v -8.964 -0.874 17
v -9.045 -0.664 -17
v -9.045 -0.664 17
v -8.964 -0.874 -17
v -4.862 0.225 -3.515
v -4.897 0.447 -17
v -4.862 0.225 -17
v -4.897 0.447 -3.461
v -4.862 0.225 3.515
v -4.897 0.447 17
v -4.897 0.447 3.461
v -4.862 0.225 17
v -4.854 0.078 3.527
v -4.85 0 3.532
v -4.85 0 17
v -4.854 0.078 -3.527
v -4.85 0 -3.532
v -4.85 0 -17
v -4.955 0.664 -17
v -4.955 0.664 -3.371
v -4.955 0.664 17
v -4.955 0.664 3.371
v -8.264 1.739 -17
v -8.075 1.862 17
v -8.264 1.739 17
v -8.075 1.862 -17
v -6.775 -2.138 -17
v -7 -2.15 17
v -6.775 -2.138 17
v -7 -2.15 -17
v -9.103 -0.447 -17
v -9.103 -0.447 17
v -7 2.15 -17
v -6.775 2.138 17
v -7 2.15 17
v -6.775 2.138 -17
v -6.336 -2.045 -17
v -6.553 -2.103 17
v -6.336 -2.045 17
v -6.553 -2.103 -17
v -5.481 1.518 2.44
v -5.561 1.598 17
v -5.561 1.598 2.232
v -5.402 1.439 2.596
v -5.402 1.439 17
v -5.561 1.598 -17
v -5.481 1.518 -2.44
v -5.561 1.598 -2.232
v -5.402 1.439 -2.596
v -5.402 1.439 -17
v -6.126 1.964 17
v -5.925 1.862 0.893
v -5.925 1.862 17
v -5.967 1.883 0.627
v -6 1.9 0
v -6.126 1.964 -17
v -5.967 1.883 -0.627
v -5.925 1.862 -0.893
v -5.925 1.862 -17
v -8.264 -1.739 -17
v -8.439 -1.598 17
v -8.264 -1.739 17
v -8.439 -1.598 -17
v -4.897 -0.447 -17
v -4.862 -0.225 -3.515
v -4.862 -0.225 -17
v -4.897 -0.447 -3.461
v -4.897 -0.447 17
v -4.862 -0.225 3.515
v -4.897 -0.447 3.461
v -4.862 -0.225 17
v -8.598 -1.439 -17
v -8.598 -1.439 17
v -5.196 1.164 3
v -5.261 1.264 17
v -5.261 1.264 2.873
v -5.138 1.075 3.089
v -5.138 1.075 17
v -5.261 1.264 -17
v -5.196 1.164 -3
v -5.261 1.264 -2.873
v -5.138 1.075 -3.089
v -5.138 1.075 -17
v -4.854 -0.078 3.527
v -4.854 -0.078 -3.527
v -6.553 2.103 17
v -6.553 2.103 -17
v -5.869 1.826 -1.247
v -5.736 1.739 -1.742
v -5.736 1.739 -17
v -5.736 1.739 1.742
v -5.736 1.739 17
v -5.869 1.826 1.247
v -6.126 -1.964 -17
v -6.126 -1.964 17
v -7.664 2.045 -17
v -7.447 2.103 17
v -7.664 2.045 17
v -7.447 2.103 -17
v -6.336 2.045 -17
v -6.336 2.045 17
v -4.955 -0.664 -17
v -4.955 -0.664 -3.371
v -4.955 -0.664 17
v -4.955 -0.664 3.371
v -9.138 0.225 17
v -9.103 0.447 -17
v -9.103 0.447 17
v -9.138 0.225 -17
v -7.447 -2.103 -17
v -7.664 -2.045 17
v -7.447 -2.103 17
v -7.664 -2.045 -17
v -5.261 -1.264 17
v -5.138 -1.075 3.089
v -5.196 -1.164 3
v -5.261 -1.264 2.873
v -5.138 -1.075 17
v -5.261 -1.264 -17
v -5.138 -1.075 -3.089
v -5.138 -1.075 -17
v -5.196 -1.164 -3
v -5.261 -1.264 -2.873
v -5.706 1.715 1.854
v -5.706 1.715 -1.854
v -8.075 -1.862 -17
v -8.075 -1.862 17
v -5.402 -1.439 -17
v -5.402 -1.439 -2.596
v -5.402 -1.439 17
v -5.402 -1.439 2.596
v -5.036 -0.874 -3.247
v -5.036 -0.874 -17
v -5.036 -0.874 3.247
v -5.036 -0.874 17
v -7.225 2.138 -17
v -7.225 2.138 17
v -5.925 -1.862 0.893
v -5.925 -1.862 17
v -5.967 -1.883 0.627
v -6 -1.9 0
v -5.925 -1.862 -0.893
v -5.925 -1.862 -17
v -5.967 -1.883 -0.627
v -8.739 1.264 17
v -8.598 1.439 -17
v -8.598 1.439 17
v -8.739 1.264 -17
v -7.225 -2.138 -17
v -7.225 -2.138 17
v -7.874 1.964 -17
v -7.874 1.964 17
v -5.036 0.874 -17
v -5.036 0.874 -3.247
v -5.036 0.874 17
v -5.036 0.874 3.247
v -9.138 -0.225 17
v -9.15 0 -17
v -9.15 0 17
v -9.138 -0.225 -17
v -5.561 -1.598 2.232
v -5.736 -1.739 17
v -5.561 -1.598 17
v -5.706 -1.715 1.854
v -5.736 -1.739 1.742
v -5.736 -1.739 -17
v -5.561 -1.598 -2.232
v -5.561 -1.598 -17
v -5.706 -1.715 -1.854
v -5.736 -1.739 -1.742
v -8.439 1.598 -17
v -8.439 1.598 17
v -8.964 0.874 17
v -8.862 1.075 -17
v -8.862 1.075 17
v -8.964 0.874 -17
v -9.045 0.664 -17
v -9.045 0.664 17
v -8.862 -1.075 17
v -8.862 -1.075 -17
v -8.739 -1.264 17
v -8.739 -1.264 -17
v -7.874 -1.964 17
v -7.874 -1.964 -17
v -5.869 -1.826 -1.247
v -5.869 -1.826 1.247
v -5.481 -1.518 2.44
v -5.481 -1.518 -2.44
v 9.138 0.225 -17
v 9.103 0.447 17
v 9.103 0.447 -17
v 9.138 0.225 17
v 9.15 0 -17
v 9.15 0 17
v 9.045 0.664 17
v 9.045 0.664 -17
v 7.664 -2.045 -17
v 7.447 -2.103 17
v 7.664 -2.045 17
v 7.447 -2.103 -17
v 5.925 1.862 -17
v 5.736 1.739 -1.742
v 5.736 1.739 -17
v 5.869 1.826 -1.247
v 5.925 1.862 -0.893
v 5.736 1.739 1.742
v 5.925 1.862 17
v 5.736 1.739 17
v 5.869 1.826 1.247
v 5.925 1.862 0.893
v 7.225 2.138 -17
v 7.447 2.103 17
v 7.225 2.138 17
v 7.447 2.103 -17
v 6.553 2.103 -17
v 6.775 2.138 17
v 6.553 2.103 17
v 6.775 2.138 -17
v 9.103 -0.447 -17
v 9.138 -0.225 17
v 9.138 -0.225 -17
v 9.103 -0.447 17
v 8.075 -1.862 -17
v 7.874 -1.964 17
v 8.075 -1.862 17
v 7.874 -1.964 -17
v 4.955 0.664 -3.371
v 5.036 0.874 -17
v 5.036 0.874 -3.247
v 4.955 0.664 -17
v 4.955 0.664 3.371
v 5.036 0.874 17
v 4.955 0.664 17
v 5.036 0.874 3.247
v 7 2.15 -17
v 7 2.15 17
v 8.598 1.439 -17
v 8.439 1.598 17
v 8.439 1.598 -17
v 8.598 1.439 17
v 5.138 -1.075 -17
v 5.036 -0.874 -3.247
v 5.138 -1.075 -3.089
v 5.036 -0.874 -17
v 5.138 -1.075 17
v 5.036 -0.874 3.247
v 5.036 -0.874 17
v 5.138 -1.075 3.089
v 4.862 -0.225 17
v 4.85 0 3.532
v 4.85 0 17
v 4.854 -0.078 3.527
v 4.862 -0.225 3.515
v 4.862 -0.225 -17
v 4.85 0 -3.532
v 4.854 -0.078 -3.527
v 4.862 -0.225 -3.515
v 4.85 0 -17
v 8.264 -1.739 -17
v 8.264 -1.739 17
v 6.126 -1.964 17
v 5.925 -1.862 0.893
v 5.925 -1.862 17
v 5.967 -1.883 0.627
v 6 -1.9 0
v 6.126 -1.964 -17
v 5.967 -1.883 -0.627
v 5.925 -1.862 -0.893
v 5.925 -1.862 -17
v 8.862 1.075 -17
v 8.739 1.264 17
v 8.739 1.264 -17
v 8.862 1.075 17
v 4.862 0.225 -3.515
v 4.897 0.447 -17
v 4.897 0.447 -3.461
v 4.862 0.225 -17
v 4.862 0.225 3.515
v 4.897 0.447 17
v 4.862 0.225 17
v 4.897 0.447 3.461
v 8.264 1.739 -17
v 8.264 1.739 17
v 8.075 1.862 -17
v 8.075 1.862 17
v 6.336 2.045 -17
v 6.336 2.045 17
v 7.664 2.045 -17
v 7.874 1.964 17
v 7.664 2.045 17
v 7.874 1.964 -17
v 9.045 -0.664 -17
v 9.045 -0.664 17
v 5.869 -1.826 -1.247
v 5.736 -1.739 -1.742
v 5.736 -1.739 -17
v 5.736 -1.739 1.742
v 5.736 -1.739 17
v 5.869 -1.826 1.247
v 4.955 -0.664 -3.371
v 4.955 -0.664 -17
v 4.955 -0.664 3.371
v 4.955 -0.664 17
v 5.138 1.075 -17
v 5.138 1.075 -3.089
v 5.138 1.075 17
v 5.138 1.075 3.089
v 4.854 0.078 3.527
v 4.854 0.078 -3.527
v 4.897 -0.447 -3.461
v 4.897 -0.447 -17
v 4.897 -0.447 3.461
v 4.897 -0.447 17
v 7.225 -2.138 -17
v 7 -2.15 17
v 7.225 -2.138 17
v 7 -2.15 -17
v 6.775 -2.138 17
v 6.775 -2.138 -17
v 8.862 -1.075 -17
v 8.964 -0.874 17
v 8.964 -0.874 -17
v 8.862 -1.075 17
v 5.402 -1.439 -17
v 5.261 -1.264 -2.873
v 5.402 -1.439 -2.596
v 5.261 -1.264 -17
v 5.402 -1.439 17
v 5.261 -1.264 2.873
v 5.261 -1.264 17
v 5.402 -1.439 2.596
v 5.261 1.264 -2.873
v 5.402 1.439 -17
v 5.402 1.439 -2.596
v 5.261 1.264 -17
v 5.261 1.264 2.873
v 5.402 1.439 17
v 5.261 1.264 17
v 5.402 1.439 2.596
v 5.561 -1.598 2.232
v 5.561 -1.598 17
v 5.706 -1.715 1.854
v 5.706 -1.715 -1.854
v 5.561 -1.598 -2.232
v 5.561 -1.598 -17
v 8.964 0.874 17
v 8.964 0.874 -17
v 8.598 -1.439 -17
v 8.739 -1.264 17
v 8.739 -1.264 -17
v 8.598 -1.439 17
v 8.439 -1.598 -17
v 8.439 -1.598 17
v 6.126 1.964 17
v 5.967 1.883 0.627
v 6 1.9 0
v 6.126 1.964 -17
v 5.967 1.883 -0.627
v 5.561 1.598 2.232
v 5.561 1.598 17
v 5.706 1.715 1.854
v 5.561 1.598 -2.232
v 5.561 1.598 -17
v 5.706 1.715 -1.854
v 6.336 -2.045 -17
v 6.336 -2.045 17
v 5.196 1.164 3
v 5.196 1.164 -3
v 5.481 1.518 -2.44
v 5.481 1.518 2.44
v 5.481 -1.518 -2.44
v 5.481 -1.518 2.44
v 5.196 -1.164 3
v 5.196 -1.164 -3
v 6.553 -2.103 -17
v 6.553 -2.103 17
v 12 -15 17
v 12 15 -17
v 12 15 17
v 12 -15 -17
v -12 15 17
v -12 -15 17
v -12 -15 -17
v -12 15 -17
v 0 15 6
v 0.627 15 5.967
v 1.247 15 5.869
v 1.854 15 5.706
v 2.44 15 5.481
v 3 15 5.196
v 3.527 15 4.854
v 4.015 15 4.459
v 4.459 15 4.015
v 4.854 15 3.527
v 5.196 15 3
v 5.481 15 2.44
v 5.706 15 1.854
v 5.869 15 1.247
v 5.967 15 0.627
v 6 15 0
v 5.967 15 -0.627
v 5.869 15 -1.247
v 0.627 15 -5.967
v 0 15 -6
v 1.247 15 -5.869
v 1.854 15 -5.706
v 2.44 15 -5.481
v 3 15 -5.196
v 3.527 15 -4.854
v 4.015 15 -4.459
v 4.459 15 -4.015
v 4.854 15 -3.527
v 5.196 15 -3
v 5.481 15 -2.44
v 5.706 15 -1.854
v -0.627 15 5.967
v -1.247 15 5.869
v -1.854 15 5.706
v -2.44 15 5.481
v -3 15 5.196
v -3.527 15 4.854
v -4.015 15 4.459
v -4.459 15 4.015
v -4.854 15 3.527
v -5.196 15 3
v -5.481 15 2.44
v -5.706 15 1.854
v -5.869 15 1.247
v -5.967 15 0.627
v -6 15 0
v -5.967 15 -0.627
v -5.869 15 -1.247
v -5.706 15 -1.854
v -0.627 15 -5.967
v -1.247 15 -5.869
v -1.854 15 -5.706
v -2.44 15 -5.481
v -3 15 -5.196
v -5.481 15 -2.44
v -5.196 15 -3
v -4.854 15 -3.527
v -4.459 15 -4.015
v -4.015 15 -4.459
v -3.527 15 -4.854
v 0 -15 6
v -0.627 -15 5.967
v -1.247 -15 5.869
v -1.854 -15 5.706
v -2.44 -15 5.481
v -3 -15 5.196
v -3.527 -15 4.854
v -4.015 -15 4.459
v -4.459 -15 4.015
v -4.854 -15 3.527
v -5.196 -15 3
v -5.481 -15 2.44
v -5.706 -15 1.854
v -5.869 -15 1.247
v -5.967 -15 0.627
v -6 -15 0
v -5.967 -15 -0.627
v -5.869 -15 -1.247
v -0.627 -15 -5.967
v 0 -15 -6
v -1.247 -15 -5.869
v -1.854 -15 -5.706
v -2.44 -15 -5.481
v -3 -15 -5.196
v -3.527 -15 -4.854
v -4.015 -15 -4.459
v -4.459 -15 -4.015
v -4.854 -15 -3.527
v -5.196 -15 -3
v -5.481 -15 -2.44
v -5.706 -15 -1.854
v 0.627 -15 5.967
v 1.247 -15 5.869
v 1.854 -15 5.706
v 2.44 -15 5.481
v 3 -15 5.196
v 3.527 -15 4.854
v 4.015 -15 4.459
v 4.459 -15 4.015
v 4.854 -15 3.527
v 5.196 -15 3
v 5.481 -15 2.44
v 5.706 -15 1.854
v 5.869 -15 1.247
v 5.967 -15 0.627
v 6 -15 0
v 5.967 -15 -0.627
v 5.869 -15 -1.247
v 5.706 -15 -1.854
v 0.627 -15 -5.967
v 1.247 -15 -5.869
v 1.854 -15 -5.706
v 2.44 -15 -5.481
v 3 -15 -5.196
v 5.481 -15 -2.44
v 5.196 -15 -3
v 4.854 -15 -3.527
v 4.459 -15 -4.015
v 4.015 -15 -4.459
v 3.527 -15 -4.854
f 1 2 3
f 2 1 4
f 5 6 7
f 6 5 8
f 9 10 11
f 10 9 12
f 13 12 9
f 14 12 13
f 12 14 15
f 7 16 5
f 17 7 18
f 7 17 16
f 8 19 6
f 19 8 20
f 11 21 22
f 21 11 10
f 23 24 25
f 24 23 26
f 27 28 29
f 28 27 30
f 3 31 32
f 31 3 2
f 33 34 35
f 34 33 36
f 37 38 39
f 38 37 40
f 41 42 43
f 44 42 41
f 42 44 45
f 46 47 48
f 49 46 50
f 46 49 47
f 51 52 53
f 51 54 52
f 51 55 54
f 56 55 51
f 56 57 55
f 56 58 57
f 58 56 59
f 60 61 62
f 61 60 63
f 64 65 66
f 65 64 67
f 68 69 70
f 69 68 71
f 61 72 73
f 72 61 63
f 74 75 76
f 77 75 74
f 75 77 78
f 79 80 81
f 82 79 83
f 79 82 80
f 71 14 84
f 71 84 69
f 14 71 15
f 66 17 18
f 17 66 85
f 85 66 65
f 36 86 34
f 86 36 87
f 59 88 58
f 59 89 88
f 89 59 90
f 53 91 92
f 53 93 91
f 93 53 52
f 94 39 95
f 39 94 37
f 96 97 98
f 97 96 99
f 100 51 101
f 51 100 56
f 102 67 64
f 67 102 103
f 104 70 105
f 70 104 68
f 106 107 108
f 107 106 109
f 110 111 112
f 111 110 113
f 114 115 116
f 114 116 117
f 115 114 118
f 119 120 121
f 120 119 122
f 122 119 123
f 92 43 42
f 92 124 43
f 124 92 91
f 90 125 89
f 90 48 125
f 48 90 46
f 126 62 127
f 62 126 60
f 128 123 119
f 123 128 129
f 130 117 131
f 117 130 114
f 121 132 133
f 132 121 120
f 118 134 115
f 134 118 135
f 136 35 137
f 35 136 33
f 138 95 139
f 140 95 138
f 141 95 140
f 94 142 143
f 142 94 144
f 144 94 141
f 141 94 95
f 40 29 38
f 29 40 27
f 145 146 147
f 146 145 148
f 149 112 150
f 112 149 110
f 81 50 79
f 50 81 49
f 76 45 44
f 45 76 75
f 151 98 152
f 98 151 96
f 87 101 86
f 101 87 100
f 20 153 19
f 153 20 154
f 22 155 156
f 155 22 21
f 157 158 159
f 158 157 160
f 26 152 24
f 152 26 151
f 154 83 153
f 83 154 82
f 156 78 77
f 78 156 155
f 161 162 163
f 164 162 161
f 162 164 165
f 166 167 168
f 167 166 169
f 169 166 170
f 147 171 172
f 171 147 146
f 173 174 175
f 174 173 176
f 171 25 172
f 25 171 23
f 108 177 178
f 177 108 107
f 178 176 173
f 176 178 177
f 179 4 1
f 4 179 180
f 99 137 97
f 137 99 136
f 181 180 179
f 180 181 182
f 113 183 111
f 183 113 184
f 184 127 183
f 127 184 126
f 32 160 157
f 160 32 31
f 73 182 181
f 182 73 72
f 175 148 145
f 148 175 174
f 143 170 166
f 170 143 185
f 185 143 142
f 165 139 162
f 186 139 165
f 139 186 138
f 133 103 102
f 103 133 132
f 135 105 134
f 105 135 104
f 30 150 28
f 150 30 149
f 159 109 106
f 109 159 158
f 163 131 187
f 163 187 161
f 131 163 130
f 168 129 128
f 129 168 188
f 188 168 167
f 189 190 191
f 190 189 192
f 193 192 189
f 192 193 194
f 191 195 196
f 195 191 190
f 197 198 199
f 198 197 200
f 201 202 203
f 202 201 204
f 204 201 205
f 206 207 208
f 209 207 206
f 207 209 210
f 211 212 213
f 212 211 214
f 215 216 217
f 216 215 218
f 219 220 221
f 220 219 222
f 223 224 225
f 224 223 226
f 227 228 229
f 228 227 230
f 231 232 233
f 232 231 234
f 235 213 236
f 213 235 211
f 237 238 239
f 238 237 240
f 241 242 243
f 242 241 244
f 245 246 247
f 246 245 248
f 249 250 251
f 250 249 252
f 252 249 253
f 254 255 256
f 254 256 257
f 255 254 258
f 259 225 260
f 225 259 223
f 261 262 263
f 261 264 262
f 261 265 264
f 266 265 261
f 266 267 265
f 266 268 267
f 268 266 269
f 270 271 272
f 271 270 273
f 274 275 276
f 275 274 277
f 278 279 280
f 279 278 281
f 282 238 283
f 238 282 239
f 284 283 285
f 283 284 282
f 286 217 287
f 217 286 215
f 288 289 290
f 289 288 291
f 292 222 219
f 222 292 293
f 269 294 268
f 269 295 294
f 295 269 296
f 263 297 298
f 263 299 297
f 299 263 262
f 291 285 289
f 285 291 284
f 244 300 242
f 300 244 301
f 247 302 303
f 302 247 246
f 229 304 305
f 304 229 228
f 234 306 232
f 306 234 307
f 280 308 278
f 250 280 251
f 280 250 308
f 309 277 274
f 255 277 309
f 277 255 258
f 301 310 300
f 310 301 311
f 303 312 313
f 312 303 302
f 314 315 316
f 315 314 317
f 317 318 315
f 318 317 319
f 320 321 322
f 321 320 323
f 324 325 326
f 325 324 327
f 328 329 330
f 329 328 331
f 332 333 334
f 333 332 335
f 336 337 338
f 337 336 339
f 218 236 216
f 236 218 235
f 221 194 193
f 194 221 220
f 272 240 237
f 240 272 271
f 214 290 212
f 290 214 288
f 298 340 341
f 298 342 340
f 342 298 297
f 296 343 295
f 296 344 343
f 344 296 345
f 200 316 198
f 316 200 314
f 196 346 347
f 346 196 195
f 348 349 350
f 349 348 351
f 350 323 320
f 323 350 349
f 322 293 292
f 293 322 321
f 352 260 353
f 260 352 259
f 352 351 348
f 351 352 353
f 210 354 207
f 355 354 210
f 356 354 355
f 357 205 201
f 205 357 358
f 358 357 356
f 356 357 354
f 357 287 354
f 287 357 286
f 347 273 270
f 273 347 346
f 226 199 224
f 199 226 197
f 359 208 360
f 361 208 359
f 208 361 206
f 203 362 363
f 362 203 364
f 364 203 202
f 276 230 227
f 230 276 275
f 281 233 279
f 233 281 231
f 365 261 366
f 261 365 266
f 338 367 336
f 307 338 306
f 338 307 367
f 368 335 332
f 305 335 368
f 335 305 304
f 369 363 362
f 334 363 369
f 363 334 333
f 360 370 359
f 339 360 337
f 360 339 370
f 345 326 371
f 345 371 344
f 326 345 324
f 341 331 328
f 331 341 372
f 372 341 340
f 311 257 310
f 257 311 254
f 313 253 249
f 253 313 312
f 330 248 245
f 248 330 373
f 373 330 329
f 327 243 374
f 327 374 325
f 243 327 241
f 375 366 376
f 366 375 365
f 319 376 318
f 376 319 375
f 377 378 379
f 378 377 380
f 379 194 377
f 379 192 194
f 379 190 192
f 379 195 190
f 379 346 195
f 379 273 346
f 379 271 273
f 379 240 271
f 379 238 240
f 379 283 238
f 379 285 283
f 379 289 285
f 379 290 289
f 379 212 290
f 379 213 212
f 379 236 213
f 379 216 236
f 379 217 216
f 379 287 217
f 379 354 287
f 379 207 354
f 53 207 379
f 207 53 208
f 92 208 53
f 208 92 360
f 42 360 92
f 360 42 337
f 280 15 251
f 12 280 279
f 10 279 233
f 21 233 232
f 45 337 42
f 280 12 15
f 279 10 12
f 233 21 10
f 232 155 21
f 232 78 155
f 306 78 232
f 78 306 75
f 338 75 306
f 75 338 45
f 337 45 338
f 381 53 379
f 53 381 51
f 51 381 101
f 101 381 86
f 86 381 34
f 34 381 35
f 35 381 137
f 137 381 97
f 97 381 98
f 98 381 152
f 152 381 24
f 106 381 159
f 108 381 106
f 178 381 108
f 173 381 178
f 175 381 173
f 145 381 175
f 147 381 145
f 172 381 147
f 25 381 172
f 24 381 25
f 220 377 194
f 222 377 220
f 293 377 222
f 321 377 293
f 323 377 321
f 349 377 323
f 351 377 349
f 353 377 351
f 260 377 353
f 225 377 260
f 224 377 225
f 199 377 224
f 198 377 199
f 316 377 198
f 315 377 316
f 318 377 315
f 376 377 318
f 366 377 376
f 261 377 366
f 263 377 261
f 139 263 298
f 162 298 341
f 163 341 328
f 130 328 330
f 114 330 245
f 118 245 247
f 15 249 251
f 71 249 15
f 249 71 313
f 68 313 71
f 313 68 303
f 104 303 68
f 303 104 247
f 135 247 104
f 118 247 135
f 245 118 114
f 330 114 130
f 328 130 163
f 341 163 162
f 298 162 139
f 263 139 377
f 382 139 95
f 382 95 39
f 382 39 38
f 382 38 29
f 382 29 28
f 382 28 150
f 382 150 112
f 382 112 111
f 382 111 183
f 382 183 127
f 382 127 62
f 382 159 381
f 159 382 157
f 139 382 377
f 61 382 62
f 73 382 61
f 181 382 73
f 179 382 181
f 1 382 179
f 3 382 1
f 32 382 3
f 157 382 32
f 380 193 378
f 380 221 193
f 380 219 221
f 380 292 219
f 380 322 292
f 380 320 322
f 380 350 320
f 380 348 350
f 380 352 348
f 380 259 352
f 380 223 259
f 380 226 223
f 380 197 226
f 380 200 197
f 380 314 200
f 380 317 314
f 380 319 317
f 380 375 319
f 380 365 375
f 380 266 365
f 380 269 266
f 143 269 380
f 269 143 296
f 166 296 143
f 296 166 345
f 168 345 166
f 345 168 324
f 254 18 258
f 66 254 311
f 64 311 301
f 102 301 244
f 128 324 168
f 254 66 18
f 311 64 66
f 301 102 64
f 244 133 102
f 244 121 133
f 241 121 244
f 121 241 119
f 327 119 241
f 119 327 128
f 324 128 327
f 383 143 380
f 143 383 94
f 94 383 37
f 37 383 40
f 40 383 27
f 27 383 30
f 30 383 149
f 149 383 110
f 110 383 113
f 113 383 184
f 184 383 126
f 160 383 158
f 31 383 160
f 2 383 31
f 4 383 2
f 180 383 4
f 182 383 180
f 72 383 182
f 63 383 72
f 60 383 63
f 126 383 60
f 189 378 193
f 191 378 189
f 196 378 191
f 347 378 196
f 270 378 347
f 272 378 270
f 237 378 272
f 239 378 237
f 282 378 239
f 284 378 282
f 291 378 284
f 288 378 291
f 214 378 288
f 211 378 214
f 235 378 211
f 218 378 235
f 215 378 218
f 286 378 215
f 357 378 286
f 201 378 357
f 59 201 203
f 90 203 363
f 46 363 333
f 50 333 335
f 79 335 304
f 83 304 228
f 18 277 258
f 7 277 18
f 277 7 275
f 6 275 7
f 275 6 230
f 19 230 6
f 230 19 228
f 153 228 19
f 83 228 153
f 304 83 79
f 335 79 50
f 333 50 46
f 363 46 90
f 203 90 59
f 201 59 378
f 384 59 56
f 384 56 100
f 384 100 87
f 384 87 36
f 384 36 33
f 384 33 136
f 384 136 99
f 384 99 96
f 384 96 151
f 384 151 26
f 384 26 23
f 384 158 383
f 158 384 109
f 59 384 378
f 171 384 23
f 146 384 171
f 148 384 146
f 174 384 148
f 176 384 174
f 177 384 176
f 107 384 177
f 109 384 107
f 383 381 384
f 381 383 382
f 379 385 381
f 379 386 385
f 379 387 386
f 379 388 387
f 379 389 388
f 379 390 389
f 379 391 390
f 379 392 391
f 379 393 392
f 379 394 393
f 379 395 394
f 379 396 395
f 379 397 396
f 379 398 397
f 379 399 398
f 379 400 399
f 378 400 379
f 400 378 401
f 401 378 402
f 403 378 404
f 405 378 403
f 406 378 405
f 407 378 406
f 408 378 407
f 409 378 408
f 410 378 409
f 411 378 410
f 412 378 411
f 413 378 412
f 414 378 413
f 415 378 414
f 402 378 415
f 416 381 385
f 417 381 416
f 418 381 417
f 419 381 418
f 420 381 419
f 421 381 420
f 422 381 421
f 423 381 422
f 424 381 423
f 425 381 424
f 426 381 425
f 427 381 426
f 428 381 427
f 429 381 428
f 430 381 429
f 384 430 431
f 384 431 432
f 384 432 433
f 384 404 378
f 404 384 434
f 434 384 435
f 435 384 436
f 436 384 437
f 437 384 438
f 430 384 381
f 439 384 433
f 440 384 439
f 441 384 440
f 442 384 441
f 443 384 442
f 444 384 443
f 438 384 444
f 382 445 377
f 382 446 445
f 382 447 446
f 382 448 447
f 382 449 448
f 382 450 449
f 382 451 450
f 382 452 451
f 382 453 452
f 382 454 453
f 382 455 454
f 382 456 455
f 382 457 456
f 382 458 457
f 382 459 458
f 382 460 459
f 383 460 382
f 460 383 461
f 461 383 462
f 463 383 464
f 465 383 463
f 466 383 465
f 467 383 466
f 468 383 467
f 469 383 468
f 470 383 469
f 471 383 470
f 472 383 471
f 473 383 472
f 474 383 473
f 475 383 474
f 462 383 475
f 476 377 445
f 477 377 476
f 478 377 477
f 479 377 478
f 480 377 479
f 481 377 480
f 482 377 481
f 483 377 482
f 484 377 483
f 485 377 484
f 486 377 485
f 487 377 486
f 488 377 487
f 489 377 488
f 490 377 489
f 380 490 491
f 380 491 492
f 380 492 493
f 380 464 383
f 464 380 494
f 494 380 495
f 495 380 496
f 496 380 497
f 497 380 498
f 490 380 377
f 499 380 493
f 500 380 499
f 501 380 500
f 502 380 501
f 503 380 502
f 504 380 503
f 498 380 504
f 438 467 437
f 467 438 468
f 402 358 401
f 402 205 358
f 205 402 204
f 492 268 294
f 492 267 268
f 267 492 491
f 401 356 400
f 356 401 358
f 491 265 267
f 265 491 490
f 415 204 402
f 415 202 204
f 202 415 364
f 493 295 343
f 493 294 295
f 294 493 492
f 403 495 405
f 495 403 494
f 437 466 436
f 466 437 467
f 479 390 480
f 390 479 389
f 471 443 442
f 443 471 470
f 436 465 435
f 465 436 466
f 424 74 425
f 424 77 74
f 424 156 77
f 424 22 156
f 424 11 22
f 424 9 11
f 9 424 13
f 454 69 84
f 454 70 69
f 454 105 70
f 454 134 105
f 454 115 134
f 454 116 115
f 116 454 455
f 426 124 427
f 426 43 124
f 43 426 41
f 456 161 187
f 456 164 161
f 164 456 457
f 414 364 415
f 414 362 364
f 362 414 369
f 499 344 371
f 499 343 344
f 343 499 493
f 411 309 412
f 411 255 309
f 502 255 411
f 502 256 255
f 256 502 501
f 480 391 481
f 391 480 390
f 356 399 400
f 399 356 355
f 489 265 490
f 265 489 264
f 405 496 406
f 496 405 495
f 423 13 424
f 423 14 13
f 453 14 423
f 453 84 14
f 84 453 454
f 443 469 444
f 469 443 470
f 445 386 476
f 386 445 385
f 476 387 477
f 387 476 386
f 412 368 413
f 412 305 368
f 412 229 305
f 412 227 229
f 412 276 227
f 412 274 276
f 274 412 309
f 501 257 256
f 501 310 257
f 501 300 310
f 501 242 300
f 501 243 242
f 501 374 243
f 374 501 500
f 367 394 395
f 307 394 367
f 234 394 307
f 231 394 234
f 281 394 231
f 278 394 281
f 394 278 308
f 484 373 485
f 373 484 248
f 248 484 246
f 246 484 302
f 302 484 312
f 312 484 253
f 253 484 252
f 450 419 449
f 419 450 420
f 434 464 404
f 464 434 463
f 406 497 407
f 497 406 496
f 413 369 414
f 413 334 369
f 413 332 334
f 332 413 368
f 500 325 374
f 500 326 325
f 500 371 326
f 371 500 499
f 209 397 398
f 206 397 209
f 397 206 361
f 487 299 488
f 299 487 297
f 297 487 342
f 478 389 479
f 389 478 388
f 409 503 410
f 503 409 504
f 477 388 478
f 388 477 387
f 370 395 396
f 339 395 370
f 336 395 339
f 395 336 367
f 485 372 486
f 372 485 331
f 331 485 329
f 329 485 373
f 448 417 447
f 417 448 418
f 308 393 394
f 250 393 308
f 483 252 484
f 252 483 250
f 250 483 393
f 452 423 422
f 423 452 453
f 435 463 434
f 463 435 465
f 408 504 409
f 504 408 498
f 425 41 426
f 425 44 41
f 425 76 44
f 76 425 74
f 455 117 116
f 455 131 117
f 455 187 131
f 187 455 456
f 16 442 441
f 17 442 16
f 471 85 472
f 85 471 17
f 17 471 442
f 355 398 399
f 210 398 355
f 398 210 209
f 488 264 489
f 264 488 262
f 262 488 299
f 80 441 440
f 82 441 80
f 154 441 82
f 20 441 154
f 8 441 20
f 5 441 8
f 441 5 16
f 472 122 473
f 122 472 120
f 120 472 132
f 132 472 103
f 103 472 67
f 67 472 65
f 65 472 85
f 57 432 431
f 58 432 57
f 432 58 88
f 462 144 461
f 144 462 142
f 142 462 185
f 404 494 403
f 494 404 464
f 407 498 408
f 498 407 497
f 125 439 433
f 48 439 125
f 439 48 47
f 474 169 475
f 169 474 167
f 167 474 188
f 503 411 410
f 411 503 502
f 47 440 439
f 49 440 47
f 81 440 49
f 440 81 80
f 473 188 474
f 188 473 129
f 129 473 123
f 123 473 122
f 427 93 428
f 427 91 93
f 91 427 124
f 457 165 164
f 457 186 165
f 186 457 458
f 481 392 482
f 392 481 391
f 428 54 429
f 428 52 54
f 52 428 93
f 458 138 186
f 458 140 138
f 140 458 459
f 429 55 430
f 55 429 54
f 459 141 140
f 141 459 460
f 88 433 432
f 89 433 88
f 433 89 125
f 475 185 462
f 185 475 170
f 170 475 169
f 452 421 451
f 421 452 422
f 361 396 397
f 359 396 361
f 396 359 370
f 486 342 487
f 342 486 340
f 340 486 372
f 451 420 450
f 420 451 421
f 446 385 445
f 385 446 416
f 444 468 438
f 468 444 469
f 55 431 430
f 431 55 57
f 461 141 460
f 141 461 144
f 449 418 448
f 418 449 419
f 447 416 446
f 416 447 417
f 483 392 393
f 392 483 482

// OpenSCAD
// Linear rail stop block.
$fn = 60;
eps = 0.02;
width = 30;
height = 34;
bore_d = 12;
length = 24;
difference() {
    cube([length,width,height],center=true);
    translate([0,-width/2-eps,0]) rotate([-90,0,0]) cylinder(d=bore_d,h=width+2*eps);
    for(x=[-7,7]) translate([x,0,-height/2-eps]) cylinder(d=4.3,h=height+2*eps);
}
